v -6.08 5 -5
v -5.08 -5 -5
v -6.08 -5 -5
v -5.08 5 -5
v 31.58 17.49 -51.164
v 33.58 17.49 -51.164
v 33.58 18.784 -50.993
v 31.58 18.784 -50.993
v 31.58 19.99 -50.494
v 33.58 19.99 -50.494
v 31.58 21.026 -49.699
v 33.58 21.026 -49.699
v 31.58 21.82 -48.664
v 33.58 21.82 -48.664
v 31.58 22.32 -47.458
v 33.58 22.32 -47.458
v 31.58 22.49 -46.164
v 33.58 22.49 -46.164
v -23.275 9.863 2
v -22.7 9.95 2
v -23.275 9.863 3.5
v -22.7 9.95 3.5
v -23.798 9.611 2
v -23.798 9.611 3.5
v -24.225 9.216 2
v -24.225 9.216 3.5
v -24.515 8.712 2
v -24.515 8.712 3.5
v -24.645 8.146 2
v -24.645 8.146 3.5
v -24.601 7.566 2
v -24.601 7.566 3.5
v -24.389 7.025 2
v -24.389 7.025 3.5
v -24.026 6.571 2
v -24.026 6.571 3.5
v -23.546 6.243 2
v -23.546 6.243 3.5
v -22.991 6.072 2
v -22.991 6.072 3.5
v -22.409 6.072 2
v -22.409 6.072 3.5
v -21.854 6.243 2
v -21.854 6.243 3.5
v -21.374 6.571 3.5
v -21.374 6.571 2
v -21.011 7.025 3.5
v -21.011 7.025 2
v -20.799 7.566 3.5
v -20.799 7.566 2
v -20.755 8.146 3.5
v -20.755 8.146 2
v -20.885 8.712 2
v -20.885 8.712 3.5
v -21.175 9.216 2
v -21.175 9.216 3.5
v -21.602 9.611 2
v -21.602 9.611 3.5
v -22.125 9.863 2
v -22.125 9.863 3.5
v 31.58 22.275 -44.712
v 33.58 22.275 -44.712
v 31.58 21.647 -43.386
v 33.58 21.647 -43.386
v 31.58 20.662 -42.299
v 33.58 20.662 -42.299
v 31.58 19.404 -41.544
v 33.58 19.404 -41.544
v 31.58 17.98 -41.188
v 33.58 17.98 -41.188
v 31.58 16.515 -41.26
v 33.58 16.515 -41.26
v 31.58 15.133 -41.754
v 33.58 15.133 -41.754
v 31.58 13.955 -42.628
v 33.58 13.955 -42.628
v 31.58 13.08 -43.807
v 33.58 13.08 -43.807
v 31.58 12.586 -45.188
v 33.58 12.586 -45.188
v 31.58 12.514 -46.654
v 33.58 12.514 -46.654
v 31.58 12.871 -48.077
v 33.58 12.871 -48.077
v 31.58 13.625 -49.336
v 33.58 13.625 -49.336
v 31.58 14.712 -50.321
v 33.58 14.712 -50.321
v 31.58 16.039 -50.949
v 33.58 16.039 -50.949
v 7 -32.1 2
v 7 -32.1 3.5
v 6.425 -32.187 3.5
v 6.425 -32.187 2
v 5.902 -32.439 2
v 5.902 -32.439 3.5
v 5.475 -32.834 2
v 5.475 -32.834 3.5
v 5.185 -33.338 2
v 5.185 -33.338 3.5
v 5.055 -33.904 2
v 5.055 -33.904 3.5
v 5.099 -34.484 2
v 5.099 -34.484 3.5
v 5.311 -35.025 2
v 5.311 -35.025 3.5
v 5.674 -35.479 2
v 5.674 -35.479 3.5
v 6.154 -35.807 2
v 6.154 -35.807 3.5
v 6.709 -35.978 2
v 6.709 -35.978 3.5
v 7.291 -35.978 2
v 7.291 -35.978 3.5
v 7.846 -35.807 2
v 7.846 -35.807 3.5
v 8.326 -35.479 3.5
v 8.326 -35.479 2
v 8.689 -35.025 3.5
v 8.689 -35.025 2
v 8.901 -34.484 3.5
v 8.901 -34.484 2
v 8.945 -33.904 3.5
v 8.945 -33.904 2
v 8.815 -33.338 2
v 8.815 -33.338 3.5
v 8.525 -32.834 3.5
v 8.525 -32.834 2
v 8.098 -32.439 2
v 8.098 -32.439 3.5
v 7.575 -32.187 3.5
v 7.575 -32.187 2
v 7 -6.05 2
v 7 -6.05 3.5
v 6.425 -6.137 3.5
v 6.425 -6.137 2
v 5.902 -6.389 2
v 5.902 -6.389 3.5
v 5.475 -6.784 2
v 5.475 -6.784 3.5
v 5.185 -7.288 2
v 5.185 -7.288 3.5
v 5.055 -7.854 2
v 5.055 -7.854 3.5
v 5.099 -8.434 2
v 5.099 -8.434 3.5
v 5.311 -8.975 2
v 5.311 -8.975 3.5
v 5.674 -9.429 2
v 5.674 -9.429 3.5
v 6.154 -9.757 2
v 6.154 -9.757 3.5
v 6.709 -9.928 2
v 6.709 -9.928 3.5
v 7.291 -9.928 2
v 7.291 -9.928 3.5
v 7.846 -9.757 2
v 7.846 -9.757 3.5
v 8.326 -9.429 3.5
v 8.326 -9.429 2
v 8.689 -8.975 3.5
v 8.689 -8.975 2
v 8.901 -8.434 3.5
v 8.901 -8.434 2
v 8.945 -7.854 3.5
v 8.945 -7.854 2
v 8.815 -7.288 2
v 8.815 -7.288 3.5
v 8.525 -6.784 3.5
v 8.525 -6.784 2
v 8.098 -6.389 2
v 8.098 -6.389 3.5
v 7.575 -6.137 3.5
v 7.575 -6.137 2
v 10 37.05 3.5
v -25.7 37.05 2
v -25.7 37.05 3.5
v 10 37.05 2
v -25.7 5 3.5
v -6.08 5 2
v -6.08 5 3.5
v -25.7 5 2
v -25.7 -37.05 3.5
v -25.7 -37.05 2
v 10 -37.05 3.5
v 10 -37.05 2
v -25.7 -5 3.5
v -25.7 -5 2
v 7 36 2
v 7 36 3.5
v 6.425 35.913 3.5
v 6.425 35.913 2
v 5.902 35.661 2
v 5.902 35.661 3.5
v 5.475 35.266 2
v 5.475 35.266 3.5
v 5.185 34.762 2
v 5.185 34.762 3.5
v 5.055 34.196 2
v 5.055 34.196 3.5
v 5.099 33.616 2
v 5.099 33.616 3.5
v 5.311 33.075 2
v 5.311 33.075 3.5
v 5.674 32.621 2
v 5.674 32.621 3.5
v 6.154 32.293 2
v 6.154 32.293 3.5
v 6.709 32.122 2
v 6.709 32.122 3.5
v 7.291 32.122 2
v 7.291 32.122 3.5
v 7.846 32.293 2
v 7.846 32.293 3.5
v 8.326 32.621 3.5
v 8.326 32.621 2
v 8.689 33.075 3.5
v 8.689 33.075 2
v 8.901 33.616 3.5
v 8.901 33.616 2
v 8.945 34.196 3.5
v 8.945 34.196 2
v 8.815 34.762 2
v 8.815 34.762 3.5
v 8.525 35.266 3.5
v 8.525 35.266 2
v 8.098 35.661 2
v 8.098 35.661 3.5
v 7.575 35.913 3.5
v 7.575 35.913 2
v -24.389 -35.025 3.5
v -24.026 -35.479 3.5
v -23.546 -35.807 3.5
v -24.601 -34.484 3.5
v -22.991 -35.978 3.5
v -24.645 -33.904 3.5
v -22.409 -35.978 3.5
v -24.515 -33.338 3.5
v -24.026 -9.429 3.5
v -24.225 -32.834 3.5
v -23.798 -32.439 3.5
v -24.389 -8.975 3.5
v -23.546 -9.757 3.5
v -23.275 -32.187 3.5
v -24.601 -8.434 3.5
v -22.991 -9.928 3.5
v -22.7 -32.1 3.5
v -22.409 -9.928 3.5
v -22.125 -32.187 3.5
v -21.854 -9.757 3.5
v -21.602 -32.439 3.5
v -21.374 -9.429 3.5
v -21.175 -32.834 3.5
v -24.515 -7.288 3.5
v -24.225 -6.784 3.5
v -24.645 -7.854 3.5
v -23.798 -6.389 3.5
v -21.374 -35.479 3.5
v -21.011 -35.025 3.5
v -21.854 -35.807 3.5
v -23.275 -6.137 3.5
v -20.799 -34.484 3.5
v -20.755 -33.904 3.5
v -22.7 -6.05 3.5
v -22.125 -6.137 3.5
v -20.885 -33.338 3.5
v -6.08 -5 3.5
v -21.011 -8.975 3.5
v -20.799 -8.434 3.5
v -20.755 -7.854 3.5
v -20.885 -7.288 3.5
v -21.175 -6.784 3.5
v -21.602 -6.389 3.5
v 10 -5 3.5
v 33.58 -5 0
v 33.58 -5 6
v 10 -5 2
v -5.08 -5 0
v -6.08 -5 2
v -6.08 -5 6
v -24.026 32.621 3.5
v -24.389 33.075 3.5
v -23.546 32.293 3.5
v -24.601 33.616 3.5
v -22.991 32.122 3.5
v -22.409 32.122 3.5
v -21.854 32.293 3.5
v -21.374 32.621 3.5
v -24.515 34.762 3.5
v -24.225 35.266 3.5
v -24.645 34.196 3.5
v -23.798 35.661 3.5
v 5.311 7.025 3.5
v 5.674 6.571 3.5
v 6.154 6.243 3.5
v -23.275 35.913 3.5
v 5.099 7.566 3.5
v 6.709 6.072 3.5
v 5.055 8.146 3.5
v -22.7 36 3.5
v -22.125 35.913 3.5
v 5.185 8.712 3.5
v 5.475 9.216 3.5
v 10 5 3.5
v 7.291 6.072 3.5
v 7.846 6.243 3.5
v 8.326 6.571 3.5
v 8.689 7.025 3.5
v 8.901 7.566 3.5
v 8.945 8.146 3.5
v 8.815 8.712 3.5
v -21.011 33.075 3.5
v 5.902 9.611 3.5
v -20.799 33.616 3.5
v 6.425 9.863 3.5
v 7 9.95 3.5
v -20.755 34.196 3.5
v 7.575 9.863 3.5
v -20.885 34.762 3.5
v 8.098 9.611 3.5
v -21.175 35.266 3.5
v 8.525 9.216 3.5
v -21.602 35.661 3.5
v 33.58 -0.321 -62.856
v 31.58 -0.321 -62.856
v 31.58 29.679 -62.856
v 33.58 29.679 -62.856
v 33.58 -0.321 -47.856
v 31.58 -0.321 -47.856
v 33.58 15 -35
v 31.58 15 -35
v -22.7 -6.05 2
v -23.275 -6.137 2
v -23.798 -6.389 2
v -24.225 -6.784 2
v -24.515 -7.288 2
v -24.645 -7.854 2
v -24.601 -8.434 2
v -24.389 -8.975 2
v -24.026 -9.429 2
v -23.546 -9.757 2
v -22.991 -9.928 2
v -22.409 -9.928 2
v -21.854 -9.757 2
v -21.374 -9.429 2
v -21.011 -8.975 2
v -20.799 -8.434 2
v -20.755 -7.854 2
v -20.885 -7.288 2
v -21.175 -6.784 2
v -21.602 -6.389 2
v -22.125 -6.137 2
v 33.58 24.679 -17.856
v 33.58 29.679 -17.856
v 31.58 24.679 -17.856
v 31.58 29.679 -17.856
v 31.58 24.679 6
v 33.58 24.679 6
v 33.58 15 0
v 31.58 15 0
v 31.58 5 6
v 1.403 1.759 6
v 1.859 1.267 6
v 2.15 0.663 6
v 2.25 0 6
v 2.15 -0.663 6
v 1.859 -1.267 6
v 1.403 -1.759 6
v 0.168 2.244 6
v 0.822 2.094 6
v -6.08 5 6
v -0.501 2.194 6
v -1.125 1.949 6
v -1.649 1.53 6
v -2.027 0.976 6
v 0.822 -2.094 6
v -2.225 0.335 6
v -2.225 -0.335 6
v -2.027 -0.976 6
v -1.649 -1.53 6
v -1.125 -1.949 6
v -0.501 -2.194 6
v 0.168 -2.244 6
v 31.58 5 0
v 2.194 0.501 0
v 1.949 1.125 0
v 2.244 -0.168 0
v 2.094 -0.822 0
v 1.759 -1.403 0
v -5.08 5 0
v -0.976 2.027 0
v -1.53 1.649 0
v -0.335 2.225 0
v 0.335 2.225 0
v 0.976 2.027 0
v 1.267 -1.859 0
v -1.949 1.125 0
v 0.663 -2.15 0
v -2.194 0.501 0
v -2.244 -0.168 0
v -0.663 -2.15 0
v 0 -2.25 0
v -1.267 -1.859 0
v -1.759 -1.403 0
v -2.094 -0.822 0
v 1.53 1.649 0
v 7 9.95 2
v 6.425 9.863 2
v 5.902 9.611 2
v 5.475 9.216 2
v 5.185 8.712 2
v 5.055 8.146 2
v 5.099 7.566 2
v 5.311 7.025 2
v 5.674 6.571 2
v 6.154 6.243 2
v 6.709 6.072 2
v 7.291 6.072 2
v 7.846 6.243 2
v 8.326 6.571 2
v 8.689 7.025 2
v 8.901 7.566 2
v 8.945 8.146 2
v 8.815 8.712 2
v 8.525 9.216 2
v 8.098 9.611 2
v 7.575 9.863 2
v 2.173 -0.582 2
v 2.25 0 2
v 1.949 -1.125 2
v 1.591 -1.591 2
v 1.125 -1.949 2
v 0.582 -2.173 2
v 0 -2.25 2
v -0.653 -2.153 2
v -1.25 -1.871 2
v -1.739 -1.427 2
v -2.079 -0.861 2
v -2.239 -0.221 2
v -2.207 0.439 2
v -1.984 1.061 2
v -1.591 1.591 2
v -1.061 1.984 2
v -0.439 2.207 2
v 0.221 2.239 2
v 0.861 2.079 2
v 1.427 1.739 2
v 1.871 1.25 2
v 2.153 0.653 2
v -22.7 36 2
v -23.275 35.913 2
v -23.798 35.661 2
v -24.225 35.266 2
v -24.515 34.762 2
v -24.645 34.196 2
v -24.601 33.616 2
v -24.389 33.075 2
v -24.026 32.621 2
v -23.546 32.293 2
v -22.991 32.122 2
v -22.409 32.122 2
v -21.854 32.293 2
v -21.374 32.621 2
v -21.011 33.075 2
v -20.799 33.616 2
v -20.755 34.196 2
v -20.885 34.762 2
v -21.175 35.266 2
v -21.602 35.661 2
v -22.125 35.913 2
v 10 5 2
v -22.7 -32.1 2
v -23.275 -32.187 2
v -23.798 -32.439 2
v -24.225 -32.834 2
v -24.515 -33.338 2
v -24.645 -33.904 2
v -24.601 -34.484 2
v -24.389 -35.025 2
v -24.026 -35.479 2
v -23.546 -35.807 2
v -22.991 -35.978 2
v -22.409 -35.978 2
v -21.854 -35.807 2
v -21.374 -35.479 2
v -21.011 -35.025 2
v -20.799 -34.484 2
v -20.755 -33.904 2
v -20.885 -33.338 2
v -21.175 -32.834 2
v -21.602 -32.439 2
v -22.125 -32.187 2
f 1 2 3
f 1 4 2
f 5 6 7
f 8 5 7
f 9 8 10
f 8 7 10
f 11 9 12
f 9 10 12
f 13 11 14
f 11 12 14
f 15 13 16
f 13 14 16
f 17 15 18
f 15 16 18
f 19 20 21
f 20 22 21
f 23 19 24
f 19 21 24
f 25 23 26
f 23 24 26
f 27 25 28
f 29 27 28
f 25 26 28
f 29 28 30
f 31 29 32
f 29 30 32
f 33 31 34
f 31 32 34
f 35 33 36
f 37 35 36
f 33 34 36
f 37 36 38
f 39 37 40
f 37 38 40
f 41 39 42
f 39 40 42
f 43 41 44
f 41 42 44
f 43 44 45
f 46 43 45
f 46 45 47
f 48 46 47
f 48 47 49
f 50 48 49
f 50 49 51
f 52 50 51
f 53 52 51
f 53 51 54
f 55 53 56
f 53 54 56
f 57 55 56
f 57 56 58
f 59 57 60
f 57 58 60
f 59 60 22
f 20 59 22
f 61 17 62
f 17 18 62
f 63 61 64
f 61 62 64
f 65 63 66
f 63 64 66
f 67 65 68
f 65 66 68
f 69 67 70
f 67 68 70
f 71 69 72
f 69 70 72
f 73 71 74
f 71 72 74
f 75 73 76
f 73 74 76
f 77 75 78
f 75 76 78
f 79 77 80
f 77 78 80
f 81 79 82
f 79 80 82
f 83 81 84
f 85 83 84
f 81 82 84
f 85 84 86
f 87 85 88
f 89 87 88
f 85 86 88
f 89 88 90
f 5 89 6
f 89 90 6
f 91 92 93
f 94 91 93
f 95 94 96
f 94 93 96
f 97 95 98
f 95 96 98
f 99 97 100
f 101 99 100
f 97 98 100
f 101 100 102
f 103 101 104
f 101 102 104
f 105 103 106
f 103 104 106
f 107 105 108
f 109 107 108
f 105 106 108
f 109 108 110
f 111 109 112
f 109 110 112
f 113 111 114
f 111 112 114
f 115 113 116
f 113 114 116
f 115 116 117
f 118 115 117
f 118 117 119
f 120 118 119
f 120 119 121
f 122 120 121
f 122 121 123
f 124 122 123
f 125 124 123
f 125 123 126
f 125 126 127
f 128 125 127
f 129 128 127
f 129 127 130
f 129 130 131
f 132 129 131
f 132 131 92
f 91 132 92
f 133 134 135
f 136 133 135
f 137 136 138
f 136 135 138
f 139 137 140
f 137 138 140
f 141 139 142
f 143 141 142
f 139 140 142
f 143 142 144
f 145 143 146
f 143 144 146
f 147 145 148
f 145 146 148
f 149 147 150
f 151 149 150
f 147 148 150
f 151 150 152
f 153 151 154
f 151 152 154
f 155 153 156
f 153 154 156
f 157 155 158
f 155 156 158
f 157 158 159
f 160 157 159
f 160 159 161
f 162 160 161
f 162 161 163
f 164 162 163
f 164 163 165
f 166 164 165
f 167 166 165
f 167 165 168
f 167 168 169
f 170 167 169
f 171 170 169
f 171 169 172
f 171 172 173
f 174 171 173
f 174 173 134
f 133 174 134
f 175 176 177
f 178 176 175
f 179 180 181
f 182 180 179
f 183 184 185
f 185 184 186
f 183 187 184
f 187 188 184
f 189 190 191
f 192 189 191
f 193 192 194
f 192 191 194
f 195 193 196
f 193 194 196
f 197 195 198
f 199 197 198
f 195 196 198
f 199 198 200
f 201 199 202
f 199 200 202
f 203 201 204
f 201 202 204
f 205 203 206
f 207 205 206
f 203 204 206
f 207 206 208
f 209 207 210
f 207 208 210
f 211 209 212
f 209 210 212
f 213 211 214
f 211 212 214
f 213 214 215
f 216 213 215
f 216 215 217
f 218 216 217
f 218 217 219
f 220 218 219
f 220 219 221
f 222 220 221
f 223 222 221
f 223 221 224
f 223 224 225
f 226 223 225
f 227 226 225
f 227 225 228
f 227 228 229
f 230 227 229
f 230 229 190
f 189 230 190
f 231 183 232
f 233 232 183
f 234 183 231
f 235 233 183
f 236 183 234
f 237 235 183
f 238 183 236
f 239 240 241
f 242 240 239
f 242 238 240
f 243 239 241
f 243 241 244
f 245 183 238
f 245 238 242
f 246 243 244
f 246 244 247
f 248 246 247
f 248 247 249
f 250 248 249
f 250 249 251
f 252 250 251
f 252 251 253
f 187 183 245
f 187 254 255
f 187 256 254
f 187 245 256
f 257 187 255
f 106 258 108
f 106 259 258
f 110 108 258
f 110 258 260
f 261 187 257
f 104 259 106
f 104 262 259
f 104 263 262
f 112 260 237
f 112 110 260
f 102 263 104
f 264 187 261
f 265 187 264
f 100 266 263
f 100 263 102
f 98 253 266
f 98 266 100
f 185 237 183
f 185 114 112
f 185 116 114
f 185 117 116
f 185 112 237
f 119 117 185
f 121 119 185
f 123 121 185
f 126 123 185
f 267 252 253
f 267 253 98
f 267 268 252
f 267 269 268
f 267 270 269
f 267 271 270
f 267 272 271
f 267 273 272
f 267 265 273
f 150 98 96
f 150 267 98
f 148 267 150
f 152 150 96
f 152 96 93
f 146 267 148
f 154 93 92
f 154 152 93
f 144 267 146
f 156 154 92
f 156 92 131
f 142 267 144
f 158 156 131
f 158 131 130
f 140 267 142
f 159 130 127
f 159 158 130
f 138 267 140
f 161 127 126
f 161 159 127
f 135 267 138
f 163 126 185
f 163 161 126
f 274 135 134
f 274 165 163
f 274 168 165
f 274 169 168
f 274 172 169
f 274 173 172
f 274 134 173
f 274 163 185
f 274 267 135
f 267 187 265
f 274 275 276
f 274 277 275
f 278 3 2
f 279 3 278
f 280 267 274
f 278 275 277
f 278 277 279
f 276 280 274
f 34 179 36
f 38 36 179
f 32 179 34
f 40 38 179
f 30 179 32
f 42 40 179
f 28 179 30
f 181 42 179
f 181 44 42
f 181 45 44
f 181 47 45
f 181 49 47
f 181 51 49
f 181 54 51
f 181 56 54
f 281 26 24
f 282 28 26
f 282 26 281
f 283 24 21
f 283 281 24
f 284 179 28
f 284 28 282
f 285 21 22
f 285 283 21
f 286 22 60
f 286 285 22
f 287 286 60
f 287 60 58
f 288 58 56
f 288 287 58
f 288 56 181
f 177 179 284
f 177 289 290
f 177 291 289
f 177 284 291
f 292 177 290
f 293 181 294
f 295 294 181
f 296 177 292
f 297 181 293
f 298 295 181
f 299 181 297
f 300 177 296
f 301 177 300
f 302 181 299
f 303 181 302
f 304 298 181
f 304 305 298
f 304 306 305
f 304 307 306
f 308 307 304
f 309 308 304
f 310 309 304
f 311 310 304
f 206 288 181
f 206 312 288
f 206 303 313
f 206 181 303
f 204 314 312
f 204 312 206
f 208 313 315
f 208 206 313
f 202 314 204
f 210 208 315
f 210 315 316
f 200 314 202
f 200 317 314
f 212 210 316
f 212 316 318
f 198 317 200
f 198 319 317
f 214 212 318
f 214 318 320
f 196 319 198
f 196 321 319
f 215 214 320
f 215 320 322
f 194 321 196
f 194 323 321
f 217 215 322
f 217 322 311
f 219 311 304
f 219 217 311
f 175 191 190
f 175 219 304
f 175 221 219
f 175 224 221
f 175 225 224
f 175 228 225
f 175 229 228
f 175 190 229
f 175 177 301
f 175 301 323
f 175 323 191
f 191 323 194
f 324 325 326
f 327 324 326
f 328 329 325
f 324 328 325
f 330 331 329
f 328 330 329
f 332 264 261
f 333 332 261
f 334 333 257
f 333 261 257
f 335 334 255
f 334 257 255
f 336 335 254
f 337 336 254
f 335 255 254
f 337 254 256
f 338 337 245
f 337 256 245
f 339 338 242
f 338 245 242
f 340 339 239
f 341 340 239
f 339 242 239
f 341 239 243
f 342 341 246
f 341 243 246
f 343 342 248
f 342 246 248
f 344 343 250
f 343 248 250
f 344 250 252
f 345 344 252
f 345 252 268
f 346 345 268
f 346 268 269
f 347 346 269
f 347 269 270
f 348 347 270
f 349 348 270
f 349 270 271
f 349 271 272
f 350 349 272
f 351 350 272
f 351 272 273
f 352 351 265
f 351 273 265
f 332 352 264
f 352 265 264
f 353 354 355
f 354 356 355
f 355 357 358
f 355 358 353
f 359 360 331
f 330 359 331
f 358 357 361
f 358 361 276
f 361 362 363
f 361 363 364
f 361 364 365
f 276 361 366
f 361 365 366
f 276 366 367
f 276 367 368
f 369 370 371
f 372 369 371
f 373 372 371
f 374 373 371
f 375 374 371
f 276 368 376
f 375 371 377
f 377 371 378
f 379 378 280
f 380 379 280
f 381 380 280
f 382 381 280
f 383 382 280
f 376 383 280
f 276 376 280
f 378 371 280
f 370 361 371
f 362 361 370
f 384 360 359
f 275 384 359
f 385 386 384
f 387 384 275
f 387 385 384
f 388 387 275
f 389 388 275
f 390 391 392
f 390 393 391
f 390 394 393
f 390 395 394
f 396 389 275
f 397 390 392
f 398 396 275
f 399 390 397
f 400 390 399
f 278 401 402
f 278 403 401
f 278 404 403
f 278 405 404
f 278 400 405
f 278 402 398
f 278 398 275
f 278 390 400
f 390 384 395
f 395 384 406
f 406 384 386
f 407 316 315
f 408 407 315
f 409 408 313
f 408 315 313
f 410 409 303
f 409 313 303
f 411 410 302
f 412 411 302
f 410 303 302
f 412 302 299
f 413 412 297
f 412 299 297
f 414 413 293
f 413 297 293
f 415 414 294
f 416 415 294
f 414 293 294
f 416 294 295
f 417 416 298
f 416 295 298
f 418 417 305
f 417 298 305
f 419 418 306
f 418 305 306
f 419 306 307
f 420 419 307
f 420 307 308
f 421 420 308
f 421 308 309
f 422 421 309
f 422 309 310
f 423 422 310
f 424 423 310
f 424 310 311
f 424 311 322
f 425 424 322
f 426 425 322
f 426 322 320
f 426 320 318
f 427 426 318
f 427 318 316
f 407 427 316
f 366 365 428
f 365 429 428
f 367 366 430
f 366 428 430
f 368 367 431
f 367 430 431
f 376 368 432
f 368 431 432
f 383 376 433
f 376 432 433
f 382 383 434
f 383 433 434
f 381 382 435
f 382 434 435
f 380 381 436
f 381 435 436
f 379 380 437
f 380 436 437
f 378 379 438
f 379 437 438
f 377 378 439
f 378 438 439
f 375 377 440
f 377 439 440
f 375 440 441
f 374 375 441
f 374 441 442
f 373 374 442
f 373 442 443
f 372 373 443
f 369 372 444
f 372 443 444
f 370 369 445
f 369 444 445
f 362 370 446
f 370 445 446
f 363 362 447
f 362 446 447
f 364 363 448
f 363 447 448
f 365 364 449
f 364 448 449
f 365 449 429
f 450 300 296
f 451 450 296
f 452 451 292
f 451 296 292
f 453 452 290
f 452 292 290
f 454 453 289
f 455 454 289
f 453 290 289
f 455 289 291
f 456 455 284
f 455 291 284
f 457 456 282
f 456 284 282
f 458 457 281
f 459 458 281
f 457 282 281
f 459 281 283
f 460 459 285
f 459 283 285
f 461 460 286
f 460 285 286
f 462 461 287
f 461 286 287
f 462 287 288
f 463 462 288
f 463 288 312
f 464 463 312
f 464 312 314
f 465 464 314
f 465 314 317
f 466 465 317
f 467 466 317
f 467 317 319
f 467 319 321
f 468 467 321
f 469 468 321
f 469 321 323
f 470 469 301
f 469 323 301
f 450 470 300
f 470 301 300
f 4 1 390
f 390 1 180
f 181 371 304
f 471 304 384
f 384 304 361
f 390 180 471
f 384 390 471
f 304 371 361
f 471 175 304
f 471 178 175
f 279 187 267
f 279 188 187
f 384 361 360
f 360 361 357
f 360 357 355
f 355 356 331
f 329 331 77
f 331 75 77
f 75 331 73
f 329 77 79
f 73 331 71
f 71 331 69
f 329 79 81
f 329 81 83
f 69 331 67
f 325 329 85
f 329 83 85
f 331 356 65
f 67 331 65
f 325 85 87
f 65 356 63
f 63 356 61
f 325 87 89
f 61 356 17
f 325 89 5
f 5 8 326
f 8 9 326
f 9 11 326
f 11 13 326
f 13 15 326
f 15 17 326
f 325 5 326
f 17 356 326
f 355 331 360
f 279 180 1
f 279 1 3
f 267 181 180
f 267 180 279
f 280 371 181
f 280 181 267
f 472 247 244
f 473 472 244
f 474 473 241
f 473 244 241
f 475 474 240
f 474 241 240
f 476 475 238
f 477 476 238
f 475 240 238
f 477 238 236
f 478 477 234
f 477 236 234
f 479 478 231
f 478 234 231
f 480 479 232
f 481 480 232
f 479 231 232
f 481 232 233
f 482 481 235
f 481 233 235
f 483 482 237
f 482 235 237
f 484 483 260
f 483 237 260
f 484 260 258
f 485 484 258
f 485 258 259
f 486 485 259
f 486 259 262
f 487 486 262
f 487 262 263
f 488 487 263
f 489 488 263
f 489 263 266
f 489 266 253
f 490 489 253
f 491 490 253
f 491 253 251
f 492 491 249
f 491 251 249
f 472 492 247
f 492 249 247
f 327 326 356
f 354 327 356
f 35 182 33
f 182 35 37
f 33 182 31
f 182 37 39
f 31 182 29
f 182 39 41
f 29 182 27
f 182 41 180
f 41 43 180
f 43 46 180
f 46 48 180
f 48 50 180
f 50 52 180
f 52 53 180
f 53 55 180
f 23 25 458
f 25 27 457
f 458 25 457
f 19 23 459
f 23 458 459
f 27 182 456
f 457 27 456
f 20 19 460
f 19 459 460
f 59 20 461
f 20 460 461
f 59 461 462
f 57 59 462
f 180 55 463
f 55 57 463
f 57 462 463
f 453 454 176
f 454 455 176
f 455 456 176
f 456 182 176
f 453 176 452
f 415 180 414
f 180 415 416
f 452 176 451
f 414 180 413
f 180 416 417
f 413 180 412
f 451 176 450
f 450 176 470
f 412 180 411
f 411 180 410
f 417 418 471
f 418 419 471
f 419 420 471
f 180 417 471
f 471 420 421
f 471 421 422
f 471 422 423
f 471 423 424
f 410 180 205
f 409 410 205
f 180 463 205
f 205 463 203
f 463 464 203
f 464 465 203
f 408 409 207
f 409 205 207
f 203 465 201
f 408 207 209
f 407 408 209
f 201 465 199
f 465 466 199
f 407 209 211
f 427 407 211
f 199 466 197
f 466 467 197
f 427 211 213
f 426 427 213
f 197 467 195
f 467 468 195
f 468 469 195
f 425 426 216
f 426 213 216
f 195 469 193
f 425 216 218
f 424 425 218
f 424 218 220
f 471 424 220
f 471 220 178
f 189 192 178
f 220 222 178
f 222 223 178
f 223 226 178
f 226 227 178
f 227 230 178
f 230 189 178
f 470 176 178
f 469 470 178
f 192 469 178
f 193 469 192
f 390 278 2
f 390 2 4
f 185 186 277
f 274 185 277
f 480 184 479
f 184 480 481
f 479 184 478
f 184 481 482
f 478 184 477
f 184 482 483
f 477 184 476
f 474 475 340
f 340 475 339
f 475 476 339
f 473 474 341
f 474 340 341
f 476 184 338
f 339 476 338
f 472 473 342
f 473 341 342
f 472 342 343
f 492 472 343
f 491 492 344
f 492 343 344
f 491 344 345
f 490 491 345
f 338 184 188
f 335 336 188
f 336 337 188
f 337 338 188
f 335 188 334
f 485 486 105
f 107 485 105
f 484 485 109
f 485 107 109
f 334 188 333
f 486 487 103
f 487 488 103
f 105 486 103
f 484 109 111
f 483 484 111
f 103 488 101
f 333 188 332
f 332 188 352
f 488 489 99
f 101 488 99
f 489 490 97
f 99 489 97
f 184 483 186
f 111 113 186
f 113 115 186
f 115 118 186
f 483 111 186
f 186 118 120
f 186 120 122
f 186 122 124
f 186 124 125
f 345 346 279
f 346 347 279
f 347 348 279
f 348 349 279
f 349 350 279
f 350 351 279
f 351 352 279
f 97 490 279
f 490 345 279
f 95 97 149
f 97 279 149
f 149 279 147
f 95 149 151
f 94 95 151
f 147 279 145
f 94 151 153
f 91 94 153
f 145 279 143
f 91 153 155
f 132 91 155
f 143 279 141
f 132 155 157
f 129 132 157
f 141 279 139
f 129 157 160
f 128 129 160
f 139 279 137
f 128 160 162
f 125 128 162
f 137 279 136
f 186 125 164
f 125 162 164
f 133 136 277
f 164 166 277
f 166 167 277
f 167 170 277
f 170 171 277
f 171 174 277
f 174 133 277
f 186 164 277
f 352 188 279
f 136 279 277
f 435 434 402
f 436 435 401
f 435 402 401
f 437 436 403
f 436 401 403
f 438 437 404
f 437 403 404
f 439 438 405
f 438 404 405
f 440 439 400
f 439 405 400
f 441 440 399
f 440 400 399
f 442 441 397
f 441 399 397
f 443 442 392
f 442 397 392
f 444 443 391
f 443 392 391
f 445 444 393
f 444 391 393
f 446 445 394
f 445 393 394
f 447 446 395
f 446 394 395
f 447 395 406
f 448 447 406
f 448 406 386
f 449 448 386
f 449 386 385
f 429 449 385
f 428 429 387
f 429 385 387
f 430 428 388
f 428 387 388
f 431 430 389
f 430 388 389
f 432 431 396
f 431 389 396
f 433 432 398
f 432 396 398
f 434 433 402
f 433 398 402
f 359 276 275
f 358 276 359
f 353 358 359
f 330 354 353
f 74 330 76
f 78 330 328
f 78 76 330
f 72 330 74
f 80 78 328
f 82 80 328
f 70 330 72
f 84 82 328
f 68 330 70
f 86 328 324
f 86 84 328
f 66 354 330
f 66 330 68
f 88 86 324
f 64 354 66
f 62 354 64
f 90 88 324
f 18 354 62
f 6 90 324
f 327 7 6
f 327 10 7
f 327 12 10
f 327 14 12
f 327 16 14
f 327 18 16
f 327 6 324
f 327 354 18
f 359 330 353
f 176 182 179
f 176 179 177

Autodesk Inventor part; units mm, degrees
ref_plane "YZ Plane" through (0, 0, 0) normal (1, 0, 0) x (0, 1, 0)
ref_plane "XZ Plane" through (0, 0, 0) normal (0, 1, 0) x (-1, 0, 0)
ref_plane "XY Plane" through (0, 0, 0) normal (0, 0, 1) x (1, 0, 0)
sketch "Sketch14" plane through (0, 0, 0) normal (0, 0, 1) x (1, 0, 0)
  line L0 (0, 0) -> (-6.08, 0)
  line L1 (-6.08, 0) -> (0, 0)
  line L2 (0, 0) -> (6.08, 0)
  line L3 (-6.08, 0) -> (-6.08, 5)
  line L4 (-6.08, 0) -> (-1.08, 0) construction
  line L5 (-6.08, 5) -> (6.08, 5)
  line L6 (6.08, 5) -> (6.08, -5)
  line L7 (6.08, -5) -> (-6.08, -5)
  line L8 (-6.08, -5) -> (-6.08, 5)
  dimension "d66" = 6.08
  dimension "d67" = 6.08
  dimension "d68" = 5
  dimension "d69" = 90
  dimension "d70" = 12.16
  dimension "d71" = 10
extrude "Extrusion7" add sketch "Sketch14" along normal blind 2
sketch "Sketch15" plane through (0, 0, 2) normal (0, 0, 1) x (1, 0, 0)
  circle A0 centre (0, 0) radius 1.0665
hole "Hole4" at (0, 0, 2) direction (0, 0, -1) diameter 4.5 end through all clearance for "Flat Head Machine Screw" size "M4" standard "Ansi Metric M Profile"
sketch "Sketch16" plane through (0, 0, 2) normal (0, 0, 1) x (1, 0, 0)
  line L0 (6.08, 5) -> (-6.08, 5) projected
  line L1 (0, 5) -> (10, 5)
  line L2 (10, 5) -> (-25.7, 5)
  line L3 (-25.7, 5) -> (-25.7, 37.05)
  line L4 (-25.7, 37.05) -> (10, 37.05)
  line L5 (10, 37.05) -> (10, 5)
  line L6 (-6.08, -5) -> (6.08, -5) projected
  line L7 (0, -5) -> (10, -5)
  line L8 (10, -5) -> (-25.7, -5)
  line L9 (-25.7, -5) -> (-25.7, -37.05)
  line L10 (-25.7, -37.05) -> (10, -37.05)
  line L11 (10, -37.05) -> (10, -5)
  line L12 (-25.7, 37.05) -> (-22.7, 37.05)
  line L13 (-22.7, 37.05) -> (-22.7, 34.05)
  line L14 (-22.7, 34.05) -> (-25.7, 34.05)
  line L15 (-25.7, 34.05) -> (-25.7, 37.05)
  line L16 (-22.7, 34.05) -> (7, 34.05)
  line L17 (7, 34.05) -> (7, 8)
  line L18 (7, 8) -> (-22.7, 8)
  line L19 (-22.7, 8) -> (-22.7, 34.05)
  line L20 (-25.7, -37.05) -> (-22.7, -37.05)
  line L21 (-22.7, -37.05) -> (-22.7, -34.05)
  line L22 (-22.7, -34.05) -> (-25.7, -34.05)
  line L23 (-25.7, -34.05) -> (-25.7, -37.05)
  line L24 (-22.7, -34.05) -> (7, -34.05)
  line L25 (7, -34.05) -> (7, -8)
  line L26 (7, -8) -> (-22.7, -8)
  line L27 (-22.7, -8) -> (-22.7, -34.05)
  line L28 (-25.7, -5) -> (10, -5)
  line L29 (10, -5) -> (10, -37.05)
  line L30 (10, -37.05) -> (-25.7, -37.05)
  line L31 (-25.7, -37.05) -> (-25.7, -5)
  point P0 (0, 0)
  dimension "d81" = 10
  dimension "d82" = 35.7
  dimension "d83" = 32.05
  dimension "d84" = 35.7
  dimension "d85" = 32.05
  dimension "d86" = 3
  dimension "d87" = 3
  dimension "d88" = 29.7
  dimension "d89" = 26.05
  dimension "d90" = 3
  dimension "d91" = 3
  dimension "d92" = 29.7
  dimension "d93" = 26.05
  dimension "d172" = 10
extrude "Extrusion8" add sketch "Sketch16" along normal blind 1.5 contours L16 L17 L18 L19 | L0 L2 L3 L14 L13 L4 L5 L1 | L13 L14 L3 L4 | L27 L26 L25 L24 | L6 L7 L11 L10 L21 L22 L9 L8 | L22 L21 L10 L9
hole "Hole5" at (-22.7, 34.05, 2) at (-22.7, 8, 2) at (7, 8, 2) at (7, 34.05, 2) at (7, -8, 2) at (7, -34.05, 2) at (-22.7, -34.05, 2) at (-22.7, -8, 2) direction (0, 0, 1) diameter 3.9 end through all clearance for "Flat Head Machine Screw" size "M3.5" standard "Ansi Metric M Profile"
sketch "Sketch17" plane through (0, 0, 2) normal (0, 0, 1) x (1, 0, 0)
  circle A0 centre (0, 0) radius 2.25 projected
  line L0 (6.08, -5) -> (6.08, 5) projected
  line L1 (6.08, 5) -> (-6.08, 5) projected
  line L2 (-6.08, 5) -> (-6.08, -5) projected
  line L3 (-6.08, -5) -> (6.08, -5) projected
extrude "Extrusion9" add sketch "Sketch17" along normal blind 4
sketch "Sketch18" plane through (6.08, -5, 0) normal (1, 0, 0) x (0, 0, -1)
  line L0 (0, 0) -> (0, 10) projected
  line L1 (0, 10) -> (-2, 10) projected
  line L2 (-3.5, 10) -> (-2, 10) projected
  line L3 (-3.5, 10) -> (-6, 10) projected
  line L4 (-6, 0) -> (-6, 10) projected
  line L5 (-3.5, 0) -> (-6, 0) projected
  line L6 (-2, 0) -> (-3.5, 0) projected
  line L7 (0, 0) -> (-2, 0) projected
  point P0 (0, 5)
extrude "Extrusion10" add sketch "Sketch18" along normal blind 35
sketch "Sketch19" plane through (41.08, -5, 0) normal (1, 0, 0) x (0, 0, -1)
  line L0 (-6, 10) -> (-6, 0) projected
  line L1 (-6, 0) -> (-16, 0)
  line L2 (-16, 0) -> (-16, 50)
  line L3 (-16, 50) -> (29, 50)
  line L4 (29, 50) -> (29, 25)
  line L5 (29, 25) -> (0, 10)
  line L6 (0, 10) -> (0, 0) projected
  line L7 (0, 10) -> (0, 0)
  line L8 (0, 0) -> (-6, 0)
  point P0 (0, 5)
  dimension "d107" = 10
  dimension "d108" = 50
  dimension "d109" = 90
  dimension "d110" = 45
  dimension "d111" = 90
  dimension "d112" = 25
extrude "Extrusion11" add sketch "Sketch19" along normal blind 2.5
sketch "Sketch21" plane through (43.58, -5, 0) normal (1, 0, 0) x (0, 0, -1)
  line L0 (-3.5, 10) -> (-6, 10) projected
  line L1 (0, 10) -> (0, 24.05)
  line L2 (0, 10) -> (14.05, 10) construction
  line L3 (0, 24.05) -> (6.713, 24.05)
  point P0 (0, 5)
  point P1 (3, 10)
  point P2 (-2, 10)
  dimension "d118" = 14.05
  dimension "d119" = 90
  dimension "d120" = 6.713
  dimension "d121" = 90
hole "Hole6" at (43.58, 19.05, -6.713) direction (-1, 0, 0) diameter 10 end through all
sketch "Sketch22" plane through (43.58, -5, 0) normal (1, 0, 0) x (0, 0, -1)
  circle A0 centre (6.713, 24.05) radius 5 projected
  line L0 (6.713, 24.05) -> (6.713, 32.05)
  line L1 (6.713, 24.05) -> (14.713, 24.05) construction
  line L2 (6.713, 32.05) -> (24.213, 32.05)
  line L3 (24.213, 32.05) -> (-10.787, 32.05)
  point P0 (0, 5)
  dimension "d129" = 8
  dimension "d130" = 90
  dimension "d131" = 17.5
  dimension "d132" = 90
  dimension "d133" = 35
hole "Hole7" at (43.58, 27.05, 10.787) at (43.58, 27.05, -24.213) direction (-1, 0, 0) diameter 4.2 end through all
sketch "Sketch23" plane through (43.58, -5, 0) normal (1, 0, 0) x (0, 0, -1)
  line L0 (-3.5, 0) -> (-2, 0) projected
  line L1 (-2, 0) -> (-2, -9)
  line L2 (-2, 0) -> (7, 0) construction
  line L3 (-2, -9) -> (33, -9) construction
  line L4 (-2, -9) -> (33, -9)
  line L5 (-2, -9) -> (33, -9) construction
  line L6 (33, -9) -> (40.7782, -1.2218)
  line L7 (40.7782, -1.2218) -> (60.7782, -1.2218)
  line L8 (33, -9) -> (68, -9)
  line L9 (33, -9) -> (68, -9) construction
  line L10 (68, -9) -> (68, -1.2218)
  line L11 (68, -1.2218) -> (60.7782, -1.2218)
  line L12 (68, -9) -> (68, -29)
  line L13 (68, -9) -> (88, -9) construction
  line L14 (68, -29) -> (-2, -29)
  line L15 (-2, -29) -> (-2, -9)
  line L16 (33, -9) -> (44.45, -9)
  line L17 (44.45, -9) -> (44.45, -13.669)
  line L18 (44.45, -9) -> (49.119, -9) construction
  line L19 (44.45, -13.669) -> (44.45, -21.669)
  line L20 (44.45, -21.669) -> (61.95, -21.669)
  line L21 (61.95, -21.669) -> (26.95, -21.669)
  circle A0 centre (26.95, -21.669) radius 2.1
  circle A1 centre (61.95, -21.669) radius 2.1
  circle A2 centre (44.45, -13.669) radius 5
  point P0 (0, 5)
  dimension "d141" = 9
  dimension "d142" = 90
  dimension "d145" = 35
  dimension "d146" = 0
  dimension "d147" = 11
  dimension "d148" = 135
  dimension "d149" = 20
  dimension "d150" = 35
  dimension "d151" = 0
  dimension "d152" = 20
  dimension "d153" = 90
  dimension "d154" = 90
  dimension "d155" = 11.45
  dimension "d156" = 4.669
  dimension "d157" = 90
  dimension "d158" = 8
  dimension "d159" = 17.5
  dimension "d160" = 35
  dimension "d161" = 4.2
  dimension "d162" = 4.2
  dimension "d163" = 10
extrude "Extrusion13" add sketch "Sketch23" against normal blind 2 contours L4 L8 A2 L12 L14 L15 | L6 L7 L11 L10 L8 A2
sketch "Sketch24" plane through (43.58, -5, 0) normal (1, 0, 0) x (0, 0, -1)
  line L0 (-16, 50) -> (-16, 0) projected
  line L1 (-16, 0) -> (-16, -29)
  line L2 (68, -29) -> (-2, -29) projected
  line L3 (-16, -29) -> (-2, -29)
  line L4 (0, 0) -> (-2, 0) projected
  line L5 (-2, -29) -> (-2, 0)
  line L6 (-16, 0) -> (0, 0) projected
  line L7 (-2, 0) -> (-16, 0)
  point P0 (0, 5)
  point P1 (3, 0)
extrude "Extrusion14" add sketch "Sketch24" against normal blind 2
sketch "Sketch25" plane through (41.58, -5, 0) normal (-1, 0, 0) x (0, 0, 1)
  line L0 (2, -9) -> (-33, -9) projected
  line L1 (-33, -9) -> (2, -9)
  line L2 (2, -9) -> (2, -11)
  line L3 (2, -11) -> (-33, -11)
  line L4 (-33, -11) -> (-33, -9)
  line L5 (2, -11) -> (6, -11)
  line L6 (6, -11) -> (6, 0)
  line L7 (6, 0) -> (2, 0)
  line L8 (2, 0) -> (2, -11)
  point P0 (0, 5)
  point P1 (2, -9)
  dimension "d168" = 35
  dimension "d169" = 2
extrude "Extrusion15" add sketch "Sketch25" along normal blind 10
sketch "Sketch27" plane through (43.58, -5, 0) normal (1, 0, 0) x (0, 0, -1)
  line L0 (68, -29) -> (-16, -29) projected
  line L1 (-16, -29) -> (69.4034, -29)
  line L2 (69.4034, -29) -> (69.4034, 52.4533)
  line L3 (69.4034, 52.4533) -> (-16, 52.4533)
  line L4 (-16, 52.4533) -> (-16, -29)
  point P0 (0, 5)
extrude "Extrusion17" cut sketch "Sketch27" against normal up to surface (12 mm away)
sketch "Sketch28" plane through (0, 0, 0) normal (0, 0, -1) x (-1, 0, 0)
  line L0 (6.08, -5) -> (-10, -5) projected
  line L1 (6.08, 5) -> (-10, 5) projected
  line L2 (6.08, -5) -> (5.08, -5)
  line L3 (5.08, -5) -> (5.08, 5)
  line L4 (5.08, 5) -> (6.08, 5)
  line L5 (6.08, 5) -> (6.08, -5)
  point P0 (0, 0)
  dimension "d177" = 1
extrude "Extrusion18" add sketch "Sketch28" along normal blind 5
sketch "Sketch29" plane through (31.58, -5, 6) normal (1, 0, 0) x (0, 0, -1)
  line L0 (6, 10) -> (6, 20)
  line L1 (6, 20) -> (41, 20)
  line L2 (6, 20) -> (41, 20) construction
  line L3 (41, 20) -> (53.8558, 4.6791)
  line L4 (53.8558, 4.6791) -> (68.8558, 4.6791)
  line L5 (68.8558, 4.6791) -> (68.8558, 34.6791)
  line L6 (68.8558, 34.6791) -> (23.8558, 34.6791)
  line L7 (68.8558, 34.6791) -> (113.8558, 34.6791) construction
  line L8 (23.8558, 34.6791) -> (23.8558, 29.6791)
  line L9 (0, 10) -> (0, 0) projected
  line L10 (0, 10) -> (0, 29.6791)
  line L11 (0, 29.6791) -> (23.8558, 29.6791)
  line L12 (6, 10) -> (6, 0)
  line L13 (6, 0) -> (0, 0)
  line L14 (0, 0) -> (0, 10)
  point P0 (6, 5)
  dimension "d180" = 10
  dimension "d181" = 35
  dimension "d182" = 0
  dimension "d183" = 20
  dimension "d184" = 130
  dimension "d185" = 15
  dimension "d186" = 30
  dimension "d187" = 45
  dimension "d188" = 180
  dimension "d189" = 5
  dimension "d190" = 90
extrude "Extrusion19" add sketch "Sketch29" along normal blind 2
sketch "Sketch30" plane through (33.58, -5, 6) normal (1, 0, 0) x (0, 0, -1)
  line L0 (68.8558, 4.6791) -> (68.8558, 34.6791) projected
  line L1 (68.8558, 34.6791) -> (52.1638, 34.6791)
  line L2 (68.8558, 34.6791) -> (23.8558, 34.6791) projected
  line L3 (52.1638, 34.6791) -> (52.1638, 22.4901)
  circle A0 centre (52.1638, 22.4901) radius 5
  point P0 (6, 5)
  dimension "d193" = 16.692
  dimension "d194" = 12.189
  dimension "d195" = 10
extrude "Extrusion20" cut sketch "Sketch30" against normal blind 10
properties part number "Shelf_half"
